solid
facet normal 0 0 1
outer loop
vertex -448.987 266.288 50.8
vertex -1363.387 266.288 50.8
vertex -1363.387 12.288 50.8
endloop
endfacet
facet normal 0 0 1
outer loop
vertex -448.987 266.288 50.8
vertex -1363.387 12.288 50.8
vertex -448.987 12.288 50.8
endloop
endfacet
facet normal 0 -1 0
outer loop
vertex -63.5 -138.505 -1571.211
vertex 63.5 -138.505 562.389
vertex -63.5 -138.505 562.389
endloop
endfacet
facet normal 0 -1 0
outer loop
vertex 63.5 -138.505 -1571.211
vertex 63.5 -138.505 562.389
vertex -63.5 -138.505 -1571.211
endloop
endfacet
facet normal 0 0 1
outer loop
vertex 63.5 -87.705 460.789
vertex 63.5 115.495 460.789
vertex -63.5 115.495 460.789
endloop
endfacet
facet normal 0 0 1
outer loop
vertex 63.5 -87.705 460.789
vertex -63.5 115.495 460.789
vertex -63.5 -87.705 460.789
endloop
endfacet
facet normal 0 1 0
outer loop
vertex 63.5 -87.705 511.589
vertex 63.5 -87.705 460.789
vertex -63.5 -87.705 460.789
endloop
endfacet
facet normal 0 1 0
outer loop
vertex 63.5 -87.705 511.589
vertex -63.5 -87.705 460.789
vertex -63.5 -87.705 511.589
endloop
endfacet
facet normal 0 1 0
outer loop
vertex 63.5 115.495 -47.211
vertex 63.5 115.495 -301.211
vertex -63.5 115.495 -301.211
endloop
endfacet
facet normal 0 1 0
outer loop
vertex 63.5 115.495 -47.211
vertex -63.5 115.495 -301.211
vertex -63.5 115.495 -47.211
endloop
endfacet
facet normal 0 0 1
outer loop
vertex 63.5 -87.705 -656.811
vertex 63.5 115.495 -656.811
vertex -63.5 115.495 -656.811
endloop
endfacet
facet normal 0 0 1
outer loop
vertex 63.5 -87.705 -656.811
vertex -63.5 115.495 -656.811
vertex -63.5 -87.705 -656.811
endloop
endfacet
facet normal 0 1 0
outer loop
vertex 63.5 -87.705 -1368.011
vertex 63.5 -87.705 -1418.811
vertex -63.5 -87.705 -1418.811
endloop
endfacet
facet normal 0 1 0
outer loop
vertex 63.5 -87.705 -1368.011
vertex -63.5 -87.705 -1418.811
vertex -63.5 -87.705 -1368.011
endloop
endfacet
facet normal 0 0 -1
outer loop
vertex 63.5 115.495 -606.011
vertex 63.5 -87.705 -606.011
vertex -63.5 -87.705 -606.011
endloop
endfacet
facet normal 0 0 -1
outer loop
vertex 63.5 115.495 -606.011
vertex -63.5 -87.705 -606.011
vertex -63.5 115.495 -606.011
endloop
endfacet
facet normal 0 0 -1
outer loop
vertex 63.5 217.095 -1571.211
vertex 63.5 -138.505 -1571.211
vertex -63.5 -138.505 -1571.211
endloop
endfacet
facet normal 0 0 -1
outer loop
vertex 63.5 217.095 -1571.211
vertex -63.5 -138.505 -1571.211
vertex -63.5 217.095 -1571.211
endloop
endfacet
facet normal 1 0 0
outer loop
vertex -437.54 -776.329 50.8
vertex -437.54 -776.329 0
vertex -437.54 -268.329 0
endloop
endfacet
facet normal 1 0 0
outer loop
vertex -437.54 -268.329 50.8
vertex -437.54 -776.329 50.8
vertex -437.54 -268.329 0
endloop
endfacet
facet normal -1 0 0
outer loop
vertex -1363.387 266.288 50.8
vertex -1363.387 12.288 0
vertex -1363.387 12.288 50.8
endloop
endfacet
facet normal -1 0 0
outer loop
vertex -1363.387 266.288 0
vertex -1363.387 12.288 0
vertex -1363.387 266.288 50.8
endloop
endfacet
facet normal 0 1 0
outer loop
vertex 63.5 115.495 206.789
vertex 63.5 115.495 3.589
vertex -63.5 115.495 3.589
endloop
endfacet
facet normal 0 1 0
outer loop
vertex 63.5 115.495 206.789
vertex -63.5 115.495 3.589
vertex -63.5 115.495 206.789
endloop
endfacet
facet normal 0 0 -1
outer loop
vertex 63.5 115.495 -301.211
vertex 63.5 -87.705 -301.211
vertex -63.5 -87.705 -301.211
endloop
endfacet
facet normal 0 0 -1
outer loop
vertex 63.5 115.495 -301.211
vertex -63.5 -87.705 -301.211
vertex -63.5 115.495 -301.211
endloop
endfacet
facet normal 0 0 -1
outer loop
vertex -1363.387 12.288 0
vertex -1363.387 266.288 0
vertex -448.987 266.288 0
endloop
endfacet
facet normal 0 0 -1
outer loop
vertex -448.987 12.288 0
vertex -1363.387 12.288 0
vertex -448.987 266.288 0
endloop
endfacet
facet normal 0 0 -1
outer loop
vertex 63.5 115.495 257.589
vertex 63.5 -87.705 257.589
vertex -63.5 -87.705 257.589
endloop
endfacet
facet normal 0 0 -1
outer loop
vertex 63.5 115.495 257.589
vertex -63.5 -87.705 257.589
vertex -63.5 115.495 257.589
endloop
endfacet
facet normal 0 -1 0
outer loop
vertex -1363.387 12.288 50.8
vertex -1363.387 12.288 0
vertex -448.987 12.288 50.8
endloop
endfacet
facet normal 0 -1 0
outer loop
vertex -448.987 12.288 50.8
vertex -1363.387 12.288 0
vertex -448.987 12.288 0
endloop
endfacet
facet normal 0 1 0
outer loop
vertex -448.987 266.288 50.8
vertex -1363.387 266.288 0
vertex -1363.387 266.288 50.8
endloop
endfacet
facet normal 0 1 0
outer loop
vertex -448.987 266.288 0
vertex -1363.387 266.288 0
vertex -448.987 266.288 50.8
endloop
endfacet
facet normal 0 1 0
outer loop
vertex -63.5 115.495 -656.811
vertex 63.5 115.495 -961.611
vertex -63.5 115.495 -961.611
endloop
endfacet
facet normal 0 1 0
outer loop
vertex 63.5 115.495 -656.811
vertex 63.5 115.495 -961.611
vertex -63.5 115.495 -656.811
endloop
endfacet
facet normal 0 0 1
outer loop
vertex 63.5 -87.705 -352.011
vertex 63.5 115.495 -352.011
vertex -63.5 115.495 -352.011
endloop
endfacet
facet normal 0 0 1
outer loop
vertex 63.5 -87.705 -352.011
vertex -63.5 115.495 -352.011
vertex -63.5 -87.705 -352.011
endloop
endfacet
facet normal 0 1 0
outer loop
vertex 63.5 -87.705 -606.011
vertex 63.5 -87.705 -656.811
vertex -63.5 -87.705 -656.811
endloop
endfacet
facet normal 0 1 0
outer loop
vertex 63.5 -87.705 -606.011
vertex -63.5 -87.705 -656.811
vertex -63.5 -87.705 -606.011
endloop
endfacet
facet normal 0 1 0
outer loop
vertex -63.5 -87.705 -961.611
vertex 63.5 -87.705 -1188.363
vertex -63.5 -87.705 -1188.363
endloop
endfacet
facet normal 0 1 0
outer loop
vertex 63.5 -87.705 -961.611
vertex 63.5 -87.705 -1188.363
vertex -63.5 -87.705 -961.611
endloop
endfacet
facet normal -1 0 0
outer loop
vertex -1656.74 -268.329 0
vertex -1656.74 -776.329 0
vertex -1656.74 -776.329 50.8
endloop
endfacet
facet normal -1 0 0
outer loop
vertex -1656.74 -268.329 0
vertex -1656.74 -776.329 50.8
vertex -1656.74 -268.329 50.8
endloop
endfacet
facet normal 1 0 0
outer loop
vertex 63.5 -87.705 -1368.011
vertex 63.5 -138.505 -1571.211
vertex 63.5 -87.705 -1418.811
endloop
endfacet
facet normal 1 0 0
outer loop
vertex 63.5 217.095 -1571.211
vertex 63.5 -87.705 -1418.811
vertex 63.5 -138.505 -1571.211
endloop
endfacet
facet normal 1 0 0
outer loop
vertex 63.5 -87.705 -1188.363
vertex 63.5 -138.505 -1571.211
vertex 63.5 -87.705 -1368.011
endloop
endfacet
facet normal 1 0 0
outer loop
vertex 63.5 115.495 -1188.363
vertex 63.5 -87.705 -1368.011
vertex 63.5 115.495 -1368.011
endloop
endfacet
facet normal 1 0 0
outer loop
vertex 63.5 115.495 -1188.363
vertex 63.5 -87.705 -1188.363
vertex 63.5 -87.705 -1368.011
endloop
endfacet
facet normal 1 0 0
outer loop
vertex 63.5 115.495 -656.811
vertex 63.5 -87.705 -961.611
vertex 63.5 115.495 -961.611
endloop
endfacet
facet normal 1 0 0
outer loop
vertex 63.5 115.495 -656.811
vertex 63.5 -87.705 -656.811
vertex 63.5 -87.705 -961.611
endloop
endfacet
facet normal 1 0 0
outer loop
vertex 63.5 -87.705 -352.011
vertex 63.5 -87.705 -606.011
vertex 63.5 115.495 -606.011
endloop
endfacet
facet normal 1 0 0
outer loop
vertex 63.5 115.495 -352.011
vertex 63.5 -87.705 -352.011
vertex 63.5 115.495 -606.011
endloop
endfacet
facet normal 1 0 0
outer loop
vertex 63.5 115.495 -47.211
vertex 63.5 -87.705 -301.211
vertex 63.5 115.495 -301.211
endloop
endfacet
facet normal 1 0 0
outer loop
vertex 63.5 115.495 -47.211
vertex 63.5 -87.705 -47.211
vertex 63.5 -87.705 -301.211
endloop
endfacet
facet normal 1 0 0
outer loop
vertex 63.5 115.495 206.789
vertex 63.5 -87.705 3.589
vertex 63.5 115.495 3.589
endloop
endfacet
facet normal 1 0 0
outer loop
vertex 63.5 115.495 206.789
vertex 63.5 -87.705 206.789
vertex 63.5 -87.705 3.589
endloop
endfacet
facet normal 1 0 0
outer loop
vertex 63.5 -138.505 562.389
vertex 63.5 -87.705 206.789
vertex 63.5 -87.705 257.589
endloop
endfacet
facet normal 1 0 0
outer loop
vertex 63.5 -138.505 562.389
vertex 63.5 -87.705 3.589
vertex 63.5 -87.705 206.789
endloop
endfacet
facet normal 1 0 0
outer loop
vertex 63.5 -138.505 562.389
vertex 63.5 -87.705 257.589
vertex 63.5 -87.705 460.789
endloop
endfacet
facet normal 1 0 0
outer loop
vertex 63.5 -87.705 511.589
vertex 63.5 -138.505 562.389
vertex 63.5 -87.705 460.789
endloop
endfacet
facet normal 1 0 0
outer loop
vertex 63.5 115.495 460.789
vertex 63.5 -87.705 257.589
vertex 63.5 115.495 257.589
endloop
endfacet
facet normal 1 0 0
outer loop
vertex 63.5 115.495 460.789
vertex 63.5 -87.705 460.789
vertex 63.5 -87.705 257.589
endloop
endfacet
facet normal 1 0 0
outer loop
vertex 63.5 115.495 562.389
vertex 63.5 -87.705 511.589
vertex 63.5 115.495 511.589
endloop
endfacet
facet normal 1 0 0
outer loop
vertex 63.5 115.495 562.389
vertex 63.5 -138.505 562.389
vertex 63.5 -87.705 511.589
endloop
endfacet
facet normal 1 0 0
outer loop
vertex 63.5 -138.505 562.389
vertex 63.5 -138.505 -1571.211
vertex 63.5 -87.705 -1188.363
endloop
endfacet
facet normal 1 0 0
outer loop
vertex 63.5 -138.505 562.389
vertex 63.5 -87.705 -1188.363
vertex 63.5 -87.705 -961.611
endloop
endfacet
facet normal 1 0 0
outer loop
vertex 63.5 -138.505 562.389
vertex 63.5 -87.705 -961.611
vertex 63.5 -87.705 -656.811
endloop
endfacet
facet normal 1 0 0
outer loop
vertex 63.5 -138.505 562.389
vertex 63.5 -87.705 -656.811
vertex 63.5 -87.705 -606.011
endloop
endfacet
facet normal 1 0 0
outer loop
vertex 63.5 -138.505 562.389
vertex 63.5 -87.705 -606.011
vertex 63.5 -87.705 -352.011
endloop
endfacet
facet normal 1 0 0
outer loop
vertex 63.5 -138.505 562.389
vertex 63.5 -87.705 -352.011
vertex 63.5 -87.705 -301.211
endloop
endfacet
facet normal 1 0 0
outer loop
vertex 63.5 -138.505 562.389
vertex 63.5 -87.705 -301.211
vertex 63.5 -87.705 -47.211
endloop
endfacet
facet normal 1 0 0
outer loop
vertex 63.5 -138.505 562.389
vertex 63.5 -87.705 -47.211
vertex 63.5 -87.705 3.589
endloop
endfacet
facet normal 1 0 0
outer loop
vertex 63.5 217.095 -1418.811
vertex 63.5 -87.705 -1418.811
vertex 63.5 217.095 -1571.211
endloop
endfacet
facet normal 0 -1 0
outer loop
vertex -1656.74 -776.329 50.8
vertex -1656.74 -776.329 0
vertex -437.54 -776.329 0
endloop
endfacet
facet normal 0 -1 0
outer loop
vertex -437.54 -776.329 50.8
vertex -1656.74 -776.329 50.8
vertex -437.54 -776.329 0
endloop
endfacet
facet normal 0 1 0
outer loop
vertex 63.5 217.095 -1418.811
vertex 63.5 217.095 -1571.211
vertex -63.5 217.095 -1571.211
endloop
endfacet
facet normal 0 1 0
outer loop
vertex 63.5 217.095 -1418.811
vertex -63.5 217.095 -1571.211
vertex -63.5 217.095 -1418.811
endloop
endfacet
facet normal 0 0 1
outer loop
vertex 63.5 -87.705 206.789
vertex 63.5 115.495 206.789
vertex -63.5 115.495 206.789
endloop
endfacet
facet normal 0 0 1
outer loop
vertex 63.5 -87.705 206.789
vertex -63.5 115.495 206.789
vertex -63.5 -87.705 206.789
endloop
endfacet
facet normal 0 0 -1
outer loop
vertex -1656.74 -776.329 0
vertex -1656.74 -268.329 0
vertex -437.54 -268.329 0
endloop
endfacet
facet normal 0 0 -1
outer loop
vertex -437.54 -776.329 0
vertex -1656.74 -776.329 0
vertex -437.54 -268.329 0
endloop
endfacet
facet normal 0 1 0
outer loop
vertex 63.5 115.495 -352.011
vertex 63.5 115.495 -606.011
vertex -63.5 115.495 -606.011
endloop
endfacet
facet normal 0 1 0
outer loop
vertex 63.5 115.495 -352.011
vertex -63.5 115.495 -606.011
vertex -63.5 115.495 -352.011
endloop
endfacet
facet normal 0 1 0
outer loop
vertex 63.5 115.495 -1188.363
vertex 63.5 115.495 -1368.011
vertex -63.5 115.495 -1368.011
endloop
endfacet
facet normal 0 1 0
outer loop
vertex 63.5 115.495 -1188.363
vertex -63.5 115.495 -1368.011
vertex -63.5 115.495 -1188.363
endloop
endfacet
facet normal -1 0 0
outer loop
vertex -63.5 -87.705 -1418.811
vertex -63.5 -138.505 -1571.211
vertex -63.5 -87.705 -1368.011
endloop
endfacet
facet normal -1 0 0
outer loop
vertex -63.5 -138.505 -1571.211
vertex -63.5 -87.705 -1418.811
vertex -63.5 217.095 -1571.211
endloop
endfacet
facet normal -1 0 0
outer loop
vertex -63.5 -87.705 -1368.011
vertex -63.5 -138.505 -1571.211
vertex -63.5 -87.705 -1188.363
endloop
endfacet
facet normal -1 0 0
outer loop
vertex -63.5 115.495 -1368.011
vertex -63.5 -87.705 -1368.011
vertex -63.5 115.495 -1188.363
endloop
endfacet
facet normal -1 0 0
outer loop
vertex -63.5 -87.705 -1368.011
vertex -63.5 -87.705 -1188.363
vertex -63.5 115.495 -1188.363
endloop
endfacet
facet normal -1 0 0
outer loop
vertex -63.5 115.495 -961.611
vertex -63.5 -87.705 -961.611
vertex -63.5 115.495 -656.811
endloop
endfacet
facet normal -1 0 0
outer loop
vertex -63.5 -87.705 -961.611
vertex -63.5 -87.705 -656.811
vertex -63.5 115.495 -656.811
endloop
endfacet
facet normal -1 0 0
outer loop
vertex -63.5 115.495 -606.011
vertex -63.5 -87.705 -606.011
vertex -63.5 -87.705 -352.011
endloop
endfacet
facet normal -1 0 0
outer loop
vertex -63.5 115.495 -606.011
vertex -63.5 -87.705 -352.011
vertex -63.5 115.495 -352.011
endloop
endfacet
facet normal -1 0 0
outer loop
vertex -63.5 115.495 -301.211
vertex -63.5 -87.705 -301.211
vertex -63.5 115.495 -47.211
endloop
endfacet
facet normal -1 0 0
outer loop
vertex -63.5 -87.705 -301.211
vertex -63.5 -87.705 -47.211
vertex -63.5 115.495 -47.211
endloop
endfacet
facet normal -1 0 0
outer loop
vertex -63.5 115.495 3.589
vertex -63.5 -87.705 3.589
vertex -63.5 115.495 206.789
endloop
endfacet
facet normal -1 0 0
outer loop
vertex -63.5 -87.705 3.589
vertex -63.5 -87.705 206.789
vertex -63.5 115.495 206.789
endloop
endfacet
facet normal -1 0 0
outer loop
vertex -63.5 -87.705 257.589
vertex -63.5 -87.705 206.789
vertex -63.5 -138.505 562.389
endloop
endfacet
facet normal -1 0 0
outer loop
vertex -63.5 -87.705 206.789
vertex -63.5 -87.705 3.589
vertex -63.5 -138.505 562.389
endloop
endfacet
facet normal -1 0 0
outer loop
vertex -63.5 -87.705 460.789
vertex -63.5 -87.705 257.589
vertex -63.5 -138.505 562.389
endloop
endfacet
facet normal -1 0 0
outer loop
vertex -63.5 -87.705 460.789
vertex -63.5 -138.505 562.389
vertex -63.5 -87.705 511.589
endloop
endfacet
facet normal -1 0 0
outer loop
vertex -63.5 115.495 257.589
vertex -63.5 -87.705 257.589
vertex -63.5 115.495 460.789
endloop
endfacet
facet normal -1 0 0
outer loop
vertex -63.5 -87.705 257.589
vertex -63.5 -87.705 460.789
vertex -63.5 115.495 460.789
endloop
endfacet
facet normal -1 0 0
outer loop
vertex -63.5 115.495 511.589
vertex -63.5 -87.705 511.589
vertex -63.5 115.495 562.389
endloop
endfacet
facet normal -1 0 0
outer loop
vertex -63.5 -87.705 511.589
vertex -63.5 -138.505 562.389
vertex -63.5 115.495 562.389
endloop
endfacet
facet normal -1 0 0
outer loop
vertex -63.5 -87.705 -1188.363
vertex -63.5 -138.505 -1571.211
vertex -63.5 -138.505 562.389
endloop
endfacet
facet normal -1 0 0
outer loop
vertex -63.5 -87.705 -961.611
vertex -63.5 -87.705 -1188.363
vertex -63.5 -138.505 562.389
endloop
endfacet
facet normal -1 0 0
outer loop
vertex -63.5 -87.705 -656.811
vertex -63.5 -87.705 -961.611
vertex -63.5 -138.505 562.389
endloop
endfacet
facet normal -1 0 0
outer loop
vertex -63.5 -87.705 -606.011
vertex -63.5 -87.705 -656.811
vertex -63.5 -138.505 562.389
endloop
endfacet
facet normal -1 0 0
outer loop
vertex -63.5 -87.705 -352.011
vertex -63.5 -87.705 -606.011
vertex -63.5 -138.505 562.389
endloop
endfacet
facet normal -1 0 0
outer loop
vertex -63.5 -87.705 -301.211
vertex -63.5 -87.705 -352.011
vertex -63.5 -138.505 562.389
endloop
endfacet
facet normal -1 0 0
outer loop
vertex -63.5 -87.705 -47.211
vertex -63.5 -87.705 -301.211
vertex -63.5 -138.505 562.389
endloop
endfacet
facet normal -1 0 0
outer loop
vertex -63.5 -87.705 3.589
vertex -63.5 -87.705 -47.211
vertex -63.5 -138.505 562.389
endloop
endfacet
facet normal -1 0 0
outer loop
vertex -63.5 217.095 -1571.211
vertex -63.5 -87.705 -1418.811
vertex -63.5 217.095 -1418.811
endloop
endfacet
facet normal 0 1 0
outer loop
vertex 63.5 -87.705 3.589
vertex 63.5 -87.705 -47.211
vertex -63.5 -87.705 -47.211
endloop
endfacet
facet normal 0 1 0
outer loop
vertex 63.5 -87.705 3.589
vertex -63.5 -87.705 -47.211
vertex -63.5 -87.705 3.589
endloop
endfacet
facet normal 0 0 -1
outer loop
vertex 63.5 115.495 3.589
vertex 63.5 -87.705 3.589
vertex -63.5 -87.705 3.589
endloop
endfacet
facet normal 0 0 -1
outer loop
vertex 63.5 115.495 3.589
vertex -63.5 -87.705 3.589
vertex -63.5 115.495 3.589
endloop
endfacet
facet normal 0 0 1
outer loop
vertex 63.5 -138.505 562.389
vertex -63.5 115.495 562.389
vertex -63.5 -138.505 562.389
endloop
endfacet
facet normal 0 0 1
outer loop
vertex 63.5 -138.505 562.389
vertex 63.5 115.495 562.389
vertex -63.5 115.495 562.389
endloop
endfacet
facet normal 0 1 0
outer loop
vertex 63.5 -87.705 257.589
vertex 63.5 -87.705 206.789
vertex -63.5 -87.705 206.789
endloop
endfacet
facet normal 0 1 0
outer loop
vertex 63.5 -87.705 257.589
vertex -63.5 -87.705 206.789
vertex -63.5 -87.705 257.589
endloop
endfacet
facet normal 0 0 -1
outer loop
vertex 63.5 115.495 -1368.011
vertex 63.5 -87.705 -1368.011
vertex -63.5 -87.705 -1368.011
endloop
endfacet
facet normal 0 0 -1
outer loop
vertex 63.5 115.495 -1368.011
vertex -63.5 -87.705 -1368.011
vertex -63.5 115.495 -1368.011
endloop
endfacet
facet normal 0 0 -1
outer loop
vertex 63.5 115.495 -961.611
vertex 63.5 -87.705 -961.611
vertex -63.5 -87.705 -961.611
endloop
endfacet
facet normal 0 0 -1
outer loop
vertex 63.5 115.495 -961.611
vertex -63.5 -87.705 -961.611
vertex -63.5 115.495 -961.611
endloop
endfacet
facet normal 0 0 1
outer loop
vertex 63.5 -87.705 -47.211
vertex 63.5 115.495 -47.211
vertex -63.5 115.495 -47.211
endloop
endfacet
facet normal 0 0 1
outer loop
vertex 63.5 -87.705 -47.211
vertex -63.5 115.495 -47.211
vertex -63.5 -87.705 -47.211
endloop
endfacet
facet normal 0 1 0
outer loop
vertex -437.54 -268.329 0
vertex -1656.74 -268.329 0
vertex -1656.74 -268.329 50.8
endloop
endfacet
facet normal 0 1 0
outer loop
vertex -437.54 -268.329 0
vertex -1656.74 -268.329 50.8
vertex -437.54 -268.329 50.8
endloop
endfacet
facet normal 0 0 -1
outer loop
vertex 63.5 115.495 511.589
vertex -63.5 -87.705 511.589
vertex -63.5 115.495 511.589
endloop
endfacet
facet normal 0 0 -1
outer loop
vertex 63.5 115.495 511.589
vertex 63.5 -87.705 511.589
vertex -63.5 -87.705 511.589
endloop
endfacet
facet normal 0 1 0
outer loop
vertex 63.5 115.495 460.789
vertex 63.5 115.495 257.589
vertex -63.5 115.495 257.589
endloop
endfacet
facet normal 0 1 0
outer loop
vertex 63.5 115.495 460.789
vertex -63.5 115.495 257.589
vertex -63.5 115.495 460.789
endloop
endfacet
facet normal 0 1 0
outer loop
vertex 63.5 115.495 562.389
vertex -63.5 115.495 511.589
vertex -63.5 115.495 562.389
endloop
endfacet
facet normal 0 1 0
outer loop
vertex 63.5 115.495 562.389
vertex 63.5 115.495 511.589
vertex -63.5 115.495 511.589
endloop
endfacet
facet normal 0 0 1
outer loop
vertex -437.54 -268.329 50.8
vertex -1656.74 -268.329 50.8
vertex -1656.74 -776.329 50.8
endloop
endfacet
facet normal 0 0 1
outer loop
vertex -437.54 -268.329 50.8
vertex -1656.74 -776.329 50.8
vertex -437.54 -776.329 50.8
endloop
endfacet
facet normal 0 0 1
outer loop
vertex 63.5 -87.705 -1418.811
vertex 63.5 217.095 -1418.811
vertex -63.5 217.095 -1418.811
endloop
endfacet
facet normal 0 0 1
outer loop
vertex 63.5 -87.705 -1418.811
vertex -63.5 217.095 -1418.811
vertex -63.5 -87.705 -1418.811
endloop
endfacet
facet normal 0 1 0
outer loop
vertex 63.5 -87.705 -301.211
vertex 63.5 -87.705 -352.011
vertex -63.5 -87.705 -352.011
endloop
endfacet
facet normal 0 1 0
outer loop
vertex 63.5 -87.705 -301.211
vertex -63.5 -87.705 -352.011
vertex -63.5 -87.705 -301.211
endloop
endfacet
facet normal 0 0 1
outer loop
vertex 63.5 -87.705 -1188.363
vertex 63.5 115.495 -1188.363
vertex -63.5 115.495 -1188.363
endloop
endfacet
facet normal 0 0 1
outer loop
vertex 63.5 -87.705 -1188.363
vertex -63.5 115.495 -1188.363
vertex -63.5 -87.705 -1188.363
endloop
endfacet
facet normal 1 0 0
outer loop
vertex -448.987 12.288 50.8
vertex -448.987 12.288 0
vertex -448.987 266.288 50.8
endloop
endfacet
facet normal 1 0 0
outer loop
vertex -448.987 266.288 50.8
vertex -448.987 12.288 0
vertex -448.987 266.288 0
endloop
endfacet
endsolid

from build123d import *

# Parameters (mm, degrees)
F1_DEPTH = 63.5
F2_W     = 914.4
F2_H     = 254
F3_DEPTH = 50.8
F4_W     = 1219.2
F4_H     = 508
F5_DEPTH = 50.8


with BuildPart() as f1:
    # F0 (on Right) → F1 (new body, symmetric)
    with BuildSketch(Plane.YZ):
        Polygon((115.495482, 562.38889), (-138.504518, 562.38889), (-138.504518, -1571.21111), (217.095482, -1571.21111), (217.095482, -1418.81111), (-87.704518, -1418.81111), (-87.704518, -1368.01111), (115.495482, -1368.01111), (115.495482, -1188.363223), (-87.704518, -1188.363223), (-87.704518, -961.61111), (115.495482, -961.61111), (115.495482, -656.81111), (-87.704518, -656.81111), (-87.704518, -606.01111), (115.495482, -606.01111), (115.495482, -352.01111), (-87.704518, -352.01111), (-87.704518, -301.21111), (115.495482, -301.21111), (115.495482, -47.21111), (-87.704518, -47.21111), (-87.704518, 3.58889), (115.495482, 3.58889), (115.495482, 206.78889), (-87.704518, 206.78889), (-87.704518, 257.58889), (115.495482, 257.58889), (115.495482, 460.78889), (-87.704518, 460.78889), (-87.704518, 511.58889), (115.495482, 511.58889), align=None)
    extrude(amount=F1_DEPTH, both=True)


with BuildPart() as f3:
    # F2 (on Top) → F3 (new body)
    with BuildSketch(Plane.XY):
        with Locations((-906.186987, 139.287787)):
            Rectangle(F2_W, F2_H)
    extrude(amount=F3_DEPTH)


with BuildPart() as f5:
    # F4 (on Top) → F5 (new body)
    with BuildSketch(Plane.XY):
        with Locations((-1047.139893, -522.328769)):
            Rectangle(F4_W, F4_H)
    extrude(amount=F5_DEPTH)


solid = Compound([f1.part, f3.part, f5.part])
